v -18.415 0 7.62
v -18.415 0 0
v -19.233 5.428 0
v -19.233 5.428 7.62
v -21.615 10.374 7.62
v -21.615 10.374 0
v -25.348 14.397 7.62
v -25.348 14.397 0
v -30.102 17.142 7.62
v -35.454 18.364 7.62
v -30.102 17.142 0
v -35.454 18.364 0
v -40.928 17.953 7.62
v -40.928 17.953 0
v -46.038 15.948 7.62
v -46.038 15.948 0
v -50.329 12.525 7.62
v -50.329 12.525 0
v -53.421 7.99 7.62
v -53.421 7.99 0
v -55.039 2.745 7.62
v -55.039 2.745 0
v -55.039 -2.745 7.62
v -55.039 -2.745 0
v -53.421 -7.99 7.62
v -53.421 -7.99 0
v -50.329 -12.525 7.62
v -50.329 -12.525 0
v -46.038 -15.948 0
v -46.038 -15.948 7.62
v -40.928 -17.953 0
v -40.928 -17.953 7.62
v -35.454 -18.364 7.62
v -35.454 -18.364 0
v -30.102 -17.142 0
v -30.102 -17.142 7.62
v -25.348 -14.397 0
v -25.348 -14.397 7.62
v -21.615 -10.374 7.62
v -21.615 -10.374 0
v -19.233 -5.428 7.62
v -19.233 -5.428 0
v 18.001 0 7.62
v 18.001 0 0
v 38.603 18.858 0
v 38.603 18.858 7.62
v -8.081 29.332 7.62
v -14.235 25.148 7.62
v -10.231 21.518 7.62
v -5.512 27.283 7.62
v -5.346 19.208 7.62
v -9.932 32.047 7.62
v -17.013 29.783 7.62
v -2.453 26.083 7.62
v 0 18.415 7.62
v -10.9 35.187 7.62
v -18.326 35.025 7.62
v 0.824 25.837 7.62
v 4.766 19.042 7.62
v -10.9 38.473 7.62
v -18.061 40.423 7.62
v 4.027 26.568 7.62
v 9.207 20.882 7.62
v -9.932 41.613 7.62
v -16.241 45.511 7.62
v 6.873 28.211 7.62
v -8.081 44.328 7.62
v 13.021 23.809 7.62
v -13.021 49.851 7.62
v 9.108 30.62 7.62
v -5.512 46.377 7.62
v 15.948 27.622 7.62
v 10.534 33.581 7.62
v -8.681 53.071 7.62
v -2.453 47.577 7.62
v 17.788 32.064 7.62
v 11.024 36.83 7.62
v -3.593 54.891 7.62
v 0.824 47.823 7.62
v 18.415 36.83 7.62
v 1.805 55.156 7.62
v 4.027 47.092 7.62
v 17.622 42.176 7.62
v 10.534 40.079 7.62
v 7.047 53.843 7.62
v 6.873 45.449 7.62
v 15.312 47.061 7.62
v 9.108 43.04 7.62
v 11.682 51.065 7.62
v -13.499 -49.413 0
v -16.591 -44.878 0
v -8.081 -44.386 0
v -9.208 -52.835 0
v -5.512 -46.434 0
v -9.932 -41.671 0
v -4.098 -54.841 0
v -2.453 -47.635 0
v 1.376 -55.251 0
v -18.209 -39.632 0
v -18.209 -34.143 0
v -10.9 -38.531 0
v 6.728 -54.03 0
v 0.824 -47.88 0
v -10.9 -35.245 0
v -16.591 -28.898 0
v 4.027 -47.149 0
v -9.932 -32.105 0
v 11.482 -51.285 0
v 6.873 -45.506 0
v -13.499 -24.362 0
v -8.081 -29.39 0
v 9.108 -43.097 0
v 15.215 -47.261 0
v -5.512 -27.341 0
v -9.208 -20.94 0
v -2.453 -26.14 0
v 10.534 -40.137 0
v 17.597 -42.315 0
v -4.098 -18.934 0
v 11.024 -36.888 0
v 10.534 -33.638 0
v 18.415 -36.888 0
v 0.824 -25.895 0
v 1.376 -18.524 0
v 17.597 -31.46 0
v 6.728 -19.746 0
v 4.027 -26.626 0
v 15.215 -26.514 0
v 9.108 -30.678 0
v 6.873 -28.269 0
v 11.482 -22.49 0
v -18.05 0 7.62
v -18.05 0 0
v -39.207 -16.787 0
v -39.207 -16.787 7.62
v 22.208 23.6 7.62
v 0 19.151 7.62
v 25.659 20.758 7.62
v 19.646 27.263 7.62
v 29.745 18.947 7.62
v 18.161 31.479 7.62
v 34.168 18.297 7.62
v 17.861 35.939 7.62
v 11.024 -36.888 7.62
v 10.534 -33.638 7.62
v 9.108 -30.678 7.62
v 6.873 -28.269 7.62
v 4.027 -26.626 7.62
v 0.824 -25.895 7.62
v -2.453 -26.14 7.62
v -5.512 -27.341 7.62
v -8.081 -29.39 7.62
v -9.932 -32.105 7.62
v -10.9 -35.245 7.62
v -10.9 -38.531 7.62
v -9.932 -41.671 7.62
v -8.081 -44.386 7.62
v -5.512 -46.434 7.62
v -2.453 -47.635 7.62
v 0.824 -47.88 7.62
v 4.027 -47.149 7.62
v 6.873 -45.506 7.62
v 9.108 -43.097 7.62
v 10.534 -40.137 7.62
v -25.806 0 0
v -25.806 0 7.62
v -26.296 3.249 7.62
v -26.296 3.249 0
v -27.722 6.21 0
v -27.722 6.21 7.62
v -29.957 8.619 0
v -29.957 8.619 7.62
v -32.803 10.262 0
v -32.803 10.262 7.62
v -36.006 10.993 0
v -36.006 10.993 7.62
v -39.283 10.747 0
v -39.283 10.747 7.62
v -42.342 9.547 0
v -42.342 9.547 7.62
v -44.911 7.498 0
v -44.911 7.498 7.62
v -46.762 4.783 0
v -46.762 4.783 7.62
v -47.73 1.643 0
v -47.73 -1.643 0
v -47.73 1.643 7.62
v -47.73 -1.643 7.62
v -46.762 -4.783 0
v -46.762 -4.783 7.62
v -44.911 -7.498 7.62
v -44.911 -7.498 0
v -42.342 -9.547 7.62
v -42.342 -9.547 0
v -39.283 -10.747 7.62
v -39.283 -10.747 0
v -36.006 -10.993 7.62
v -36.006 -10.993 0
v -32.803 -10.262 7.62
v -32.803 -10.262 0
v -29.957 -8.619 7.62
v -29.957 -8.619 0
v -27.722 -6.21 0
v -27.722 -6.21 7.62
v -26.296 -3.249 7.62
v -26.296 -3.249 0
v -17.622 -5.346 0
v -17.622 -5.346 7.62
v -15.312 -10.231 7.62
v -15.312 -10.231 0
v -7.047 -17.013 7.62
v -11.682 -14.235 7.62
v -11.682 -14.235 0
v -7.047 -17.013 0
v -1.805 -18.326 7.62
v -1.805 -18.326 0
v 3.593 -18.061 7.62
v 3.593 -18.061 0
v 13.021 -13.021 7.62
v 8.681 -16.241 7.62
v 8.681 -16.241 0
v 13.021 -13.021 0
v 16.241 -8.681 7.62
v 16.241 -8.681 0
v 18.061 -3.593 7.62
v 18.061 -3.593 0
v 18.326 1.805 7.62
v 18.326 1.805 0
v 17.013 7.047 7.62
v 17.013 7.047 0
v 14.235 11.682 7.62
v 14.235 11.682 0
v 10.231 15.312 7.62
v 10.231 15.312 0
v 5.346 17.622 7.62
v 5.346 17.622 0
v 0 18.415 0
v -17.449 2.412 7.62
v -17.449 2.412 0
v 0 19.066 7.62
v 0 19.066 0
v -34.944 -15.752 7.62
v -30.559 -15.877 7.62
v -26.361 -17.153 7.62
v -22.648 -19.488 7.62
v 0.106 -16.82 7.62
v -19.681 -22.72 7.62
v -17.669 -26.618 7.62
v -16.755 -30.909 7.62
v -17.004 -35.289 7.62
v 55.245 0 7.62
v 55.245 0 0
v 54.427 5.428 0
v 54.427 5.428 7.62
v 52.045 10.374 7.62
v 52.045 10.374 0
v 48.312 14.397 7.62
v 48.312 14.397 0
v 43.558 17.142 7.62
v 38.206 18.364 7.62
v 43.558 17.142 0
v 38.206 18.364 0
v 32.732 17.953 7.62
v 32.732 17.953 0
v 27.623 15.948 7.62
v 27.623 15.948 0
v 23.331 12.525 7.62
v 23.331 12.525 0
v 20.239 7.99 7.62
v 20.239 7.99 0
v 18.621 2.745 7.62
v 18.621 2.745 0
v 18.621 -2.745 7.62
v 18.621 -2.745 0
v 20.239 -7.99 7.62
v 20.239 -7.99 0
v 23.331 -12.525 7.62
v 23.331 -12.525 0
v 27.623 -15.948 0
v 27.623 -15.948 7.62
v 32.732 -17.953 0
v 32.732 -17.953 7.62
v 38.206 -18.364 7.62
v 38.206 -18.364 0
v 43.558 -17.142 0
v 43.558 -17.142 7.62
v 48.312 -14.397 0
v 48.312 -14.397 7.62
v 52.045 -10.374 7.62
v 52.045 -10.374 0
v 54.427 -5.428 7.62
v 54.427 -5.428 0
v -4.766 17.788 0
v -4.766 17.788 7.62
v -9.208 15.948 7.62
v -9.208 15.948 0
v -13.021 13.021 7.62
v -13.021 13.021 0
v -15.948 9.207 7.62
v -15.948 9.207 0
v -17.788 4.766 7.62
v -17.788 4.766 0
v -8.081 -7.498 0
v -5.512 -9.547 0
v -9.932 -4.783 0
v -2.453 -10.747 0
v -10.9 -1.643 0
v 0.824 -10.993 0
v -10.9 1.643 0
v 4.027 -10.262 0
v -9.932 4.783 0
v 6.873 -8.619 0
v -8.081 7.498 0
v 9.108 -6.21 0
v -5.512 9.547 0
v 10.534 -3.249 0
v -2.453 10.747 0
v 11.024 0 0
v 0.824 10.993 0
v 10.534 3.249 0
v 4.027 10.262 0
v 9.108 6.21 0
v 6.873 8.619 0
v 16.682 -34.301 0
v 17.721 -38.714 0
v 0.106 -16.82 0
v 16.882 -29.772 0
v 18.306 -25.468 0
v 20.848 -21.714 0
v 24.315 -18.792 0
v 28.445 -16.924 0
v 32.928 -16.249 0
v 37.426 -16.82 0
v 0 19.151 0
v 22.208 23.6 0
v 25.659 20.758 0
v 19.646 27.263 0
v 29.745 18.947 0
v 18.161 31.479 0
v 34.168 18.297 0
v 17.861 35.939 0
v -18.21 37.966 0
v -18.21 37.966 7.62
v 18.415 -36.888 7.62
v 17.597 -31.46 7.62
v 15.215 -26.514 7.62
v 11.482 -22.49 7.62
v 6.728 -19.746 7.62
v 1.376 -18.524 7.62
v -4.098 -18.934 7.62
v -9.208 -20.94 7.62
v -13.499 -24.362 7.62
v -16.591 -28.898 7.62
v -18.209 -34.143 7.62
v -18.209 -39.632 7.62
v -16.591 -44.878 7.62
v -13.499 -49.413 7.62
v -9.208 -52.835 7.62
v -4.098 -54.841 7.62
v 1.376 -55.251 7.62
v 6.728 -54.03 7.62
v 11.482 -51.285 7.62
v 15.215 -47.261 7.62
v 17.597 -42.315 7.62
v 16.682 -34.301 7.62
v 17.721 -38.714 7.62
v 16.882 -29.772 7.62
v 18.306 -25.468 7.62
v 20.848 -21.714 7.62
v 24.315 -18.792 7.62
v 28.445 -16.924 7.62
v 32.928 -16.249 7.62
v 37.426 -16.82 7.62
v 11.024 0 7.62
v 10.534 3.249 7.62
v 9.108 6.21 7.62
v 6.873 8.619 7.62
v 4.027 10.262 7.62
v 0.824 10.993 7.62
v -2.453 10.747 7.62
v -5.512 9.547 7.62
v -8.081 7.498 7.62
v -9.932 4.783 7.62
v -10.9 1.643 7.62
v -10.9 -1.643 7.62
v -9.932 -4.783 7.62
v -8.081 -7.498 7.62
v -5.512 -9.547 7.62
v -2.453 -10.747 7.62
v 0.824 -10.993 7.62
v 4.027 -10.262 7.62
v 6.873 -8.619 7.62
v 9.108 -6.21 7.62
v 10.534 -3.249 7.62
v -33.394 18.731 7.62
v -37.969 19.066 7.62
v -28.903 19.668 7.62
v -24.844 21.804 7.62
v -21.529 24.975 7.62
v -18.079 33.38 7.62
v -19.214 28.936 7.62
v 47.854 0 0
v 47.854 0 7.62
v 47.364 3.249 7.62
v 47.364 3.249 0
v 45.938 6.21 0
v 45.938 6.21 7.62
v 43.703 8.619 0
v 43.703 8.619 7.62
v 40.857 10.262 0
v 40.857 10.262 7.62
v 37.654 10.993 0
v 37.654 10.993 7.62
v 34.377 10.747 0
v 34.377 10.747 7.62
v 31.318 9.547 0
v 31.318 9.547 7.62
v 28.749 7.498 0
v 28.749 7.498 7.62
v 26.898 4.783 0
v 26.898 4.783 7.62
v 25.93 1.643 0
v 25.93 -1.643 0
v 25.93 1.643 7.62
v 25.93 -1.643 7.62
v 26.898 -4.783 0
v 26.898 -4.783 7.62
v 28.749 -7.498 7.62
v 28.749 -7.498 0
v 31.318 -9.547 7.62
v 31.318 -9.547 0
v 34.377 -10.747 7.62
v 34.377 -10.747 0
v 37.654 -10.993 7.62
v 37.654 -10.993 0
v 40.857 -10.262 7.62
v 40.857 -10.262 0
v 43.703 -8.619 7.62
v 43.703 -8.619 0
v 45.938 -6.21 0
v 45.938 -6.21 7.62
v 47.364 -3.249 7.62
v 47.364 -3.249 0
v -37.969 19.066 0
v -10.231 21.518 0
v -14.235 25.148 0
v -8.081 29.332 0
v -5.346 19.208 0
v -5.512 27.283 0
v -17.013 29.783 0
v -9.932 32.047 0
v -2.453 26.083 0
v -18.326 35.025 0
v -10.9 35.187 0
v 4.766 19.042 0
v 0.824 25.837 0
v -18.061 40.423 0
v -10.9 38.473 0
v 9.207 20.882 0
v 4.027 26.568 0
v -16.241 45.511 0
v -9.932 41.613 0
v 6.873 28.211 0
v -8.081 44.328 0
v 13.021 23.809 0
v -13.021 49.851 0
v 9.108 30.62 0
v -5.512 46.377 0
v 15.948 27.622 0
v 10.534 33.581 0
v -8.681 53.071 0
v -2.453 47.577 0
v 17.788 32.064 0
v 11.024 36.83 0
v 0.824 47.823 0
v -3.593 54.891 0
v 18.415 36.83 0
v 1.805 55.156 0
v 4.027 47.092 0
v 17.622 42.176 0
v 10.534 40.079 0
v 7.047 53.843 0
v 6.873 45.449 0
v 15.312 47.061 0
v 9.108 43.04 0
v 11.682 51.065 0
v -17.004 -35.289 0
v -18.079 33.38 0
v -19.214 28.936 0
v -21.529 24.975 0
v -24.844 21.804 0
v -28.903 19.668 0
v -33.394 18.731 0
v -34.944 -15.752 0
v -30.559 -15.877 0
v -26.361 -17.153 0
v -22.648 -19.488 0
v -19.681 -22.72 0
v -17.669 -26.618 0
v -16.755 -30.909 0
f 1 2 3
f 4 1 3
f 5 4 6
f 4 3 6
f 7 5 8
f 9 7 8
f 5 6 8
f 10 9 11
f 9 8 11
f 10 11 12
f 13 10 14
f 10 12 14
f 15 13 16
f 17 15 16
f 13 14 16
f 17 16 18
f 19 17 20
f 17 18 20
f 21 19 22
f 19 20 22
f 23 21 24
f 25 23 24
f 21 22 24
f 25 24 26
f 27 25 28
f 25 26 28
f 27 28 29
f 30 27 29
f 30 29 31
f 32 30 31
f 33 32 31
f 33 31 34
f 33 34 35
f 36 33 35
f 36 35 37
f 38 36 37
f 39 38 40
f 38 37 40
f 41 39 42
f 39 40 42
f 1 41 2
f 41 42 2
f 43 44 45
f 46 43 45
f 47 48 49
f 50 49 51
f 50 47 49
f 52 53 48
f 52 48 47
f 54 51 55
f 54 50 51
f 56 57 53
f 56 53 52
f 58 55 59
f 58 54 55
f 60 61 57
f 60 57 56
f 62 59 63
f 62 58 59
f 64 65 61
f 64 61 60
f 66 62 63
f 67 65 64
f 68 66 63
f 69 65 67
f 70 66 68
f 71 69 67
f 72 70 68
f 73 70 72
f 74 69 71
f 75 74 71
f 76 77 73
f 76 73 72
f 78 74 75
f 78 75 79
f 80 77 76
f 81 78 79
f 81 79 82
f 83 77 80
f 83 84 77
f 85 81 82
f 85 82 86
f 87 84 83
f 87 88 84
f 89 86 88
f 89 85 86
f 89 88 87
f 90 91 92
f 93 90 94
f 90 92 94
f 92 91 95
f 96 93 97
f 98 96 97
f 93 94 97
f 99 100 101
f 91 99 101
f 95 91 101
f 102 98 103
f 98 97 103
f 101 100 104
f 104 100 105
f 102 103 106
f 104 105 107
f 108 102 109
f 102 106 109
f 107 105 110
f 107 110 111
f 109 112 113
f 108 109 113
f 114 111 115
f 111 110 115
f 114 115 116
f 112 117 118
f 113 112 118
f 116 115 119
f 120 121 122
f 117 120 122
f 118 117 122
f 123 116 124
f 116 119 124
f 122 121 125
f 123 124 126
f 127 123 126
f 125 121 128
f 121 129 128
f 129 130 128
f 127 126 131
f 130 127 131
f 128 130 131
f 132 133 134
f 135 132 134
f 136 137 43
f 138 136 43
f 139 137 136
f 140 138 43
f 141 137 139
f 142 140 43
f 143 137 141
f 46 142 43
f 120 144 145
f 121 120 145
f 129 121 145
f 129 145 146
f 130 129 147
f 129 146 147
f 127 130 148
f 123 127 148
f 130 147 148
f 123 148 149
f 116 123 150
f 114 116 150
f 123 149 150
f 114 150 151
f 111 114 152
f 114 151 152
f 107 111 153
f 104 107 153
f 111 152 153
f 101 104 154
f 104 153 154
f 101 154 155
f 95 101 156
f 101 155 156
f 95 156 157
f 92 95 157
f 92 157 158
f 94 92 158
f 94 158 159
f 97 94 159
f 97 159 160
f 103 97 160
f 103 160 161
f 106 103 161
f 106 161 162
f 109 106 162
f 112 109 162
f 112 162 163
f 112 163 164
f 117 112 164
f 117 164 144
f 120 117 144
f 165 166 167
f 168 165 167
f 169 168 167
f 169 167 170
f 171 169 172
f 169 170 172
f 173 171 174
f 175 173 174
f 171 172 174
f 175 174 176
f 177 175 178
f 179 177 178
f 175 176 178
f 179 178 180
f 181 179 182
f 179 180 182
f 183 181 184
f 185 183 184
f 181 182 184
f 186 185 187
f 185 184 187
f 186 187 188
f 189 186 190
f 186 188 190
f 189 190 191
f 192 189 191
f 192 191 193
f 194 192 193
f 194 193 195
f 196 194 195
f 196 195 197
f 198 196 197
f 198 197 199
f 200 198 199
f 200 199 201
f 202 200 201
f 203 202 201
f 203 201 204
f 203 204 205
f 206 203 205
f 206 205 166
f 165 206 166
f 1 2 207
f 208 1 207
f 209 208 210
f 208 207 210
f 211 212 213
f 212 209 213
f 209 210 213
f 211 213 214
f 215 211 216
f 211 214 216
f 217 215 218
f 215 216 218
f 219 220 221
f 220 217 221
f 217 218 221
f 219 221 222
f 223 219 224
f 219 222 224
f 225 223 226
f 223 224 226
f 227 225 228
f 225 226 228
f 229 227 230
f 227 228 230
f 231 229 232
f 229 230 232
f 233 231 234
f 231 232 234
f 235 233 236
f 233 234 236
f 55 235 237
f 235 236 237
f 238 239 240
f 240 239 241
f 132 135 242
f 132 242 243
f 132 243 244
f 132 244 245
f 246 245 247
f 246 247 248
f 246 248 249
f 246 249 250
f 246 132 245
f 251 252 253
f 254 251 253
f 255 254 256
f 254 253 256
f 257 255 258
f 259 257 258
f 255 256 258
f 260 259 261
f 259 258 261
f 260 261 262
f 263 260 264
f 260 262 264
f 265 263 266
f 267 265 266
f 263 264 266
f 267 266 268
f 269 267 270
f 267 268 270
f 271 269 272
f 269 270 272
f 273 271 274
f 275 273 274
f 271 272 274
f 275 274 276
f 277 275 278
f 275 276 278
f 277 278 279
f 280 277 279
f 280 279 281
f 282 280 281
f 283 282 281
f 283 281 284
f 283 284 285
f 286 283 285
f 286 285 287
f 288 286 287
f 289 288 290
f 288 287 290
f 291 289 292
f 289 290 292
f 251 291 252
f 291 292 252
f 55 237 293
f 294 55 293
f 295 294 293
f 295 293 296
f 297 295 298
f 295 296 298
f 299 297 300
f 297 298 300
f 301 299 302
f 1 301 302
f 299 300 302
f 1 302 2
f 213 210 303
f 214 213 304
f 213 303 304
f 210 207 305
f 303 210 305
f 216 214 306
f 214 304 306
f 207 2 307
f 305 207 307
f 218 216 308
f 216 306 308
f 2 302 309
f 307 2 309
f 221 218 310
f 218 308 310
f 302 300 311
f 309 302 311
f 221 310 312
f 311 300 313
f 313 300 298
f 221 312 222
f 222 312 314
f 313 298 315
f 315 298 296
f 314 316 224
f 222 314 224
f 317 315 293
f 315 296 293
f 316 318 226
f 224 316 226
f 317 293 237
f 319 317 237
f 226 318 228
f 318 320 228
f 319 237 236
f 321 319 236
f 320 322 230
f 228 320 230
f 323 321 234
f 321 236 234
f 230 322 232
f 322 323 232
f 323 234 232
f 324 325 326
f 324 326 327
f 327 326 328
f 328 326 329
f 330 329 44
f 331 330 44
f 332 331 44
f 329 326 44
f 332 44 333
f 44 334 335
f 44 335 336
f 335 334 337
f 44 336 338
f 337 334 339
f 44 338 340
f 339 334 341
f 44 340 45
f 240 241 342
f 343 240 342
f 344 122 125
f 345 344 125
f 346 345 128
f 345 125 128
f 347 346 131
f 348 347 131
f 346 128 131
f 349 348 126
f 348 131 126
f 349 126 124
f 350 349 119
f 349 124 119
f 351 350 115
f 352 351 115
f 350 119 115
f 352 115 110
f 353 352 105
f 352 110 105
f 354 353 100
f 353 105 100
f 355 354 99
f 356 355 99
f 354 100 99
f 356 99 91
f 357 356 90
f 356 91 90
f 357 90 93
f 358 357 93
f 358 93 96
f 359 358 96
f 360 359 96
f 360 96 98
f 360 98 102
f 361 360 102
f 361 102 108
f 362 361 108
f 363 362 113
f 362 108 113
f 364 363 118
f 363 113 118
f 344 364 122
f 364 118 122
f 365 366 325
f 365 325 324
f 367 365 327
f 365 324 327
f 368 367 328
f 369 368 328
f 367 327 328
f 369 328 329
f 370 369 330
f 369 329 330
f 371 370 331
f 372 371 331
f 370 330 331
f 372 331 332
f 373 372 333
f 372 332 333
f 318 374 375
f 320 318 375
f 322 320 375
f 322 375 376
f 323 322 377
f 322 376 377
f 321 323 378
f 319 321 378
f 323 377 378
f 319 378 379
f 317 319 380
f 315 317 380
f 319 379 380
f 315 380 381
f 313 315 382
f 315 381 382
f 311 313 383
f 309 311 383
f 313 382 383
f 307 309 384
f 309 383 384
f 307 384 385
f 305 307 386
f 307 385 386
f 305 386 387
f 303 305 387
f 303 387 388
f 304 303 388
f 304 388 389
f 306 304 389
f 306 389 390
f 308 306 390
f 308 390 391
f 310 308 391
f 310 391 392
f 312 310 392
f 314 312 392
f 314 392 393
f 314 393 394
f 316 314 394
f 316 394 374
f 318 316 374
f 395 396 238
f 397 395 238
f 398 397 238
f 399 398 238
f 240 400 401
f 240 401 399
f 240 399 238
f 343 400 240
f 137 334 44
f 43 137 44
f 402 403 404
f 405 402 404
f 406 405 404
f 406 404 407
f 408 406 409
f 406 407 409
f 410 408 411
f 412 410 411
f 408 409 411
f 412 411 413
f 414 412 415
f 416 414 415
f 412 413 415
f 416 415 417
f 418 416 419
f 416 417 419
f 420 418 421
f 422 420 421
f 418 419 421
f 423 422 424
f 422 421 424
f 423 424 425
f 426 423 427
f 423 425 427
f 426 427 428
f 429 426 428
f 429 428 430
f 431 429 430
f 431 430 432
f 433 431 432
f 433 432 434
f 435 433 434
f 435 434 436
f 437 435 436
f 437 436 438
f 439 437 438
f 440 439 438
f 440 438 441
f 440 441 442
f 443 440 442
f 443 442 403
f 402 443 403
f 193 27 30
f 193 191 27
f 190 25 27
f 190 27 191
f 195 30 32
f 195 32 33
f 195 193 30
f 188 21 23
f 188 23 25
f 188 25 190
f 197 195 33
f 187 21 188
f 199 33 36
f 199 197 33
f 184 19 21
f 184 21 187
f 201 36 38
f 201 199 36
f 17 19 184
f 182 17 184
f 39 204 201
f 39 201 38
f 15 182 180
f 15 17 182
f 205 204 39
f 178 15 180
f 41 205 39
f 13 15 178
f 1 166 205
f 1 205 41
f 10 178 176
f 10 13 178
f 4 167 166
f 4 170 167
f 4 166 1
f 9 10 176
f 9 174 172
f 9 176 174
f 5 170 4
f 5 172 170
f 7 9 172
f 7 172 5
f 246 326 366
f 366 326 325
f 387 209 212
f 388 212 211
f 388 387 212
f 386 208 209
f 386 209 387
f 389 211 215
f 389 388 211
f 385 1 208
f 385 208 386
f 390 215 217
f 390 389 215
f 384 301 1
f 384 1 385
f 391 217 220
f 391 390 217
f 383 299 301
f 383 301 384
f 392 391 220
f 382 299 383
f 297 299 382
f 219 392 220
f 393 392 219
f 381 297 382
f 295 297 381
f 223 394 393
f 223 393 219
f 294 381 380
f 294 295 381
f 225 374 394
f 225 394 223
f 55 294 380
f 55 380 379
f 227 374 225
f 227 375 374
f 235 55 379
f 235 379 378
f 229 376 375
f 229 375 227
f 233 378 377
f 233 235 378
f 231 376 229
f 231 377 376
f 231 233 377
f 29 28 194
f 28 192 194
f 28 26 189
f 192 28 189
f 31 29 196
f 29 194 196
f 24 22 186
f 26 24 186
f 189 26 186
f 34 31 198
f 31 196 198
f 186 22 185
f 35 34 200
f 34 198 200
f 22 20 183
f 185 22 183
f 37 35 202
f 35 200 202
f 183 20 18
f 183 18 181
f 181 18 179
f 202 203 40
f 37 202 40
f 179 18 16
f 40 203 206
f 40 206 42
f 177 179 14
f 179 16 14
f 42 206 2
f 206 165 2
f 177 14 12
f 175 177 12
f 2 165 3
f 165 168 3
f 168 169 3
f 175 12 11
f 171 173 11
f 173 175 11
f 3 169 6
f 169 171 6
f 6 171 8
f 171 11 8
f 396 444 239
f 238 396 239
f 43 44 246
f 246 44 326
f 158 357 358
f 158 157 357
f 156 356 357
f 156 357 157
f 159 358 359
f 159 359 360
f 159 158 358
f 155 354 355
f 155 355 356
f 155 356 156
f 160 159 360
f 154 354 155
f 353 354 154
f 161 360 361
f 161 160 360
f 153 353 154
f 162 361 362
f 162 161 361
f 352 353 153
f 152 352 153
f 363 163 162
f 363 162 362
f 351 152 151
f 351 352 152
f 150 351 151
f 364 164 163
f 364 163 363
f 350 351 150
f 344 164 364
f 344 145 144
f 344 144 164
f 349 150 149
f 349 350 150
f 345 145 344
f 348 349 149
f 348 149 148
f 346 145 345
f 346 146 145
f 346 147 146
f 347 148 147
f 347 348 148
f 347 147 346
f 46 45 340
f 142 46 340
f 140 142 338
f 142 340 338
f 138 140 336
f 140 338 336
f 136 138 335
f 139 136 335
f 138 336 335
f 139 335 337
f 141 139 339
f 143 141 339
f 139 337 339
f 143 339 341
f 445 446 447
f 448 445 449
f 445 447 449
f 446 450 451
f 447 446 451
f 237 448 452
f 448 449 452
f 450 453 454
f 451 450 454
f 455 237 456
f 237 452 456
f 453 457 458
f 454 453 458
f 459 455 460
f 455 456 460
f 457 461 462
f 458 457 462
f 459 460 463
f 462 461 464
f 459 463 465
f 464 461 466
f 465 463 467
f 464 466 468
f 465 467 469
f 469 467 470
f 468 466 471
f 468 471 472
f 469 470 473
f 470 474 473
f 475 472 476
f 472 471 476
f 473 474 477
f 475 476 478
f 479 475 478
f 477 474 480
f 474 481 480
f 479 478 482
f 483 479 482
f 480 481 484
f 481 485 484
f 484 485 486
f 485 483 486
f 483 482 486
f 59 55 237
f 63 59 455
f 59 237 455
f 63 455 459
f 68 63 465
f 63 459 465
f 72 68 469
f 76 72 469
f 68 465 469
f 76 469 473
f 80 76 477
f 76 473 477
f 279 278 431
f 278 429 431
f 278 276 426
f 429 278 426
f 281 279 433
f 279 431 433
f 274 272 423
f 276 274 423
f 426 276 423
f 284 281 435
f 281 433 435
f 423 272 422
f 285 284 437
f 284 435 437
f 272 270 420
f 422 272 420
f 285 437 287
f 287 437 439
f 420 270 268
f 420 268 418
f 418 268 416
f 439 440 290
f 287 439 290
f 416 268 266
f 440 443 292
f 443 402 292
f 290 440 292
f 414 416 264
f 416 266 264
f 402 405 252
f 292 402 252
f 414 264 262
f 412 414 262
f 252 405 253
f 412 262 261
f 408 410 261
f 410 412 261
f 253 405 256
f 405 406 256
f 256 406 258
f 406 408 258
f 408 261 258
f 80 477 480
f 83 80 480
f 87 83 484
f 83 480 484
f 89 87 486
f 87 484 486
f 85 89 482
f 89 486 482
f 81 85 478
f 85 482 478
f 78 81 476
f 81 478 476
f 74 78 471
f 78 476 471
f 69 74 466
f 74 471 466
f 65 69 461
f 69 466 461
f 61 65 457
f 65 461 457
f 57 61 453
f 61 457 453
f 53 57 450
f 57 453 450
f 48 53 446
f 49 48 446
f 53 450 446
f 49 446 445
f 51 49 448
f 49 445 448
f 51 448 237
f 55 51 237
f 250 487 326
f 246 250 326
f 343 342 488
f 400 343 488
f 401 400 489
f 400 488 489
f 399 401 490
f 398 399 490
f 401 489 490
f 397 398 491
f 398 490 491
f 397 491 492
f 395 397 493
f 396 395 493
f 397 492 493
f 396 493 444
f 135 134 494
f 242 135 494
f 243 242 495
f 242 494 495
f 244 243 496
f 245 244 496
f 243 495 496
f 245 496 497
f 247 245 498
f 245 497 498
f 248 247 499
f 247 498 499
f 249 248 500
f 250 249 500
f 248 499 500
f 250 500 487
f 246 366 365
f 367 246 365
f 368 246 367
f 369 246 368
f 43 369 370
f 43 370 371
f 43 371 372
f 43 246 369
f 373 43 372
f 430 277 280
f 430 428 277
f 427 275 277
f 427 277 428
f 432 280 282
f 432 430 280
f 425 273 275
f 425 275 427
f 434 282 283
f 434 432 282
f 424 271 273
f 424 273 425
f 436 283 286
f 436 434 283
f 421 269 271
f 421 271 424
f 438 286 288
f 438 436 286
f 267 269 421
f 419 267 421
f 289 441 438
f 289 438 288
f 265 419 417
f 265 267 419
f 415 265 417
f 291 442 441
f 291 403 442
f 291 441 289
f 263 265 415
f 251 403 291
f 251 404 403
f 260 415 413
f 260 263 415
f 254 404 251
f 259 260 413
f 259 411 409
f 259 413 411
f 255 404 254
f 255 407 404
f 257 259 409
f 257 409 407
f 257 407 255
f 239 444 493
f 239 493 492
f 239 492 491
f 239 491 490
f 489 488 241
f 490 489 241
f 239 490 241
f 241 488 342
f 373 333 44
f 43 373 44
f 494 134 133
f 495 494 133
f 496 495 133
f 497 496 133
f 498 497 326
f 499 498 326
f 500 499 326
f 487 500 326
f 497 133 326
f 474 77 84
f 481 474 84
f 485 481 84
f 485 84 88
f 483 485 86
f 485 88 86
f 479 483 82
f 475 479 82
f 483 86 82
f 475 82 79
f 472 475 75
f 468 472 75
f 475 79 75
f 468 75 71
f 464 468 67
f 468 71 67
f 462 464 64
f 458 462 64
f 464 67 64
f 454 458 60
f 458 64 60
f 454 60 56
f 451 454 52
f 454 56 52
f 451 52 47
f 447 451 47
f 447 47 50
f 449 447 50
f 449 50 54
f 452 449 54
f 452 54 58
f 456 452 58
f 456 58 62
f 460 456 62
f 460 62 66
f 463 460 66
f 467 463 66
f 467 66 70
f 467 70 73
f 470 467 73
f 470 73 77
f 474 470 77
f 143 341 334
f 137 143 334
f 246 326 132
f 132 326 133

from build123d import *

# Parameters (mm, degrees)
F0_R      = 18.415
F1_DEPTH  = 7.62
F2_R      = 11.0236
F3_DEPTH  = 25.4
F4_R      = 18.415
F5_DEPTH  = 7.62
F6_R      = 18.415
F7_DEPTH  = 7.62
F9_DEPTH  = 7.62
F11_DEPTH = 7.62
F12_R     = 11.0236
F13_DEPTH = 25.4
F14_R     = 11.0236
F15_DEPTH = 25.4
F16_R     = 11.0236
F17_DEPTH = 25.4
F18_R     = 11.0236
F19_DEPTH = 25.4


with BuildPart() as f1:
    # F0 (on Top) → F1 (new body)
    with BuildSketch(Plane.XY):
        Circle(F0_R)
    extrude(amount=F1_DEPTH)

    # F2 (on face) → F3 (cut)
    with BuildSketch(Plane.XY.offset(7.62)):
        Circle(F2_R)
    extrude(amount=-F3_DEPTH, mode=Mode.SUBTRACT)

    # F4 (on Top) → F5 (join)
    with BuildSketch(Plane.XY):
        with Locations((0, 36.83)):
            Circle(F4_R)
    extrude(amount=F5_DEPTH)

    # F6 (on Top) → F7 (join)
    with BuildSketch(Plane.XY):
        with Locations((-36.83, 0)):
            Circle(F6_R)
        with Locations((36.830008, 0)):
            Circle(F6_R)
        with Locations((0, -36.88756)):
            Circle(F6_R)
    extrude(amount=F7_DEPTH)

    # F12 (on face) → F13 (cut)
    with BuildSketch(Plane.XY.offset(7.62)):
        with Locations((0, 36.83)):
            Circle(F12_R)
    extrude(amount=-F13_DEPTH, mode=Mode.SUBTRACT)

    # F14 (on face) → F15 (cut)
    with BuildSketch(Plane.XY.offset(7.62)):
        with Locations((-36.83, 0)):
            Circle(F14_R)
    extrude(amount=-F15_DEPTH, mode=Mode.SUBTRACT)

    # F16 (on face) → F17 (cut)
    with BuildSketch(Plane.XY.offset(7.62)):
        with Locations((0, -36.88756)):
            Circle(F16_R)
    extrude(amount=-F17_DEPTH, mode=Mode.SUBTRACT)

    # F18 (on face) → F19 (cut)
    with BuildSketch(Plane.XY.offset(7.62)):
        with Locations((36.830008, 0)):
            Circle(F18_R)
    extrude(amount=-F19_DEPTH, mode=Mode.SUBTRACT)


with BuildPart() as f9:
    # F8 (on Top) → F9 (new body)
    with BuildSketch(Plane.XY):
        with BuildLine():
            ThreePointArc((-18.21006, 37.965997), (-23.075391, 23.273694), (-37.969321, 19.065835))
            Line((-37.969321, 19.065835), (-17.44899, 2.411649))
            Line((-17.44899, 2.411649), (0, 19.065835))
            Line((0, 19.065835), (-18.21006, 37.965997))
        make_face()
    extrude(amount=F9_DEPTH)


with BuildPart() as f11:
    # F10 (on Top) → F11 (new body)
    with BuildSketch(Plane.XY):
        with BuildLine():
            Line((-17.004127, -35.289032), (0.105946, -16.819843))
            Line((0.105946, -16.819843), (-18.049959, 0))
            Line((-18.049959, 0), (-39.207064, -16.786588))
            ThreePointArc((-39.207064, -16.786588), (-22.64771, -19.488346), (-17.004127, -35.289032))
        make_face()
        with BuildLine():
            Line((37.425859, -16.819843), (18.000819, 0))
            Line((18.000819, 0), (0.105946, -16.819843))
            Line((0.105946, -16.819843), (17.721173, -38.713932))
            ThreePointArc((17.721173, -38.713932), (20.847804, -21.713745), (37.425859, -16.819843))
        make_face()
        with BuildLine():
            ThreePointArc((38.60252, 18.85836), (23.836713, 22.061984), (17.861157, 35.939483))
            Line((17.861157, 35.939483), (0, 19.15133))
            Line((0, 19.15133), (18.000819, 0))
            Line((18.000819, 0), (38.60252, 18.85836))
        make_face()
    extrude(amount=F11_DEPTH)


solid = Compound([f1.part, f9.part, f11.part])
